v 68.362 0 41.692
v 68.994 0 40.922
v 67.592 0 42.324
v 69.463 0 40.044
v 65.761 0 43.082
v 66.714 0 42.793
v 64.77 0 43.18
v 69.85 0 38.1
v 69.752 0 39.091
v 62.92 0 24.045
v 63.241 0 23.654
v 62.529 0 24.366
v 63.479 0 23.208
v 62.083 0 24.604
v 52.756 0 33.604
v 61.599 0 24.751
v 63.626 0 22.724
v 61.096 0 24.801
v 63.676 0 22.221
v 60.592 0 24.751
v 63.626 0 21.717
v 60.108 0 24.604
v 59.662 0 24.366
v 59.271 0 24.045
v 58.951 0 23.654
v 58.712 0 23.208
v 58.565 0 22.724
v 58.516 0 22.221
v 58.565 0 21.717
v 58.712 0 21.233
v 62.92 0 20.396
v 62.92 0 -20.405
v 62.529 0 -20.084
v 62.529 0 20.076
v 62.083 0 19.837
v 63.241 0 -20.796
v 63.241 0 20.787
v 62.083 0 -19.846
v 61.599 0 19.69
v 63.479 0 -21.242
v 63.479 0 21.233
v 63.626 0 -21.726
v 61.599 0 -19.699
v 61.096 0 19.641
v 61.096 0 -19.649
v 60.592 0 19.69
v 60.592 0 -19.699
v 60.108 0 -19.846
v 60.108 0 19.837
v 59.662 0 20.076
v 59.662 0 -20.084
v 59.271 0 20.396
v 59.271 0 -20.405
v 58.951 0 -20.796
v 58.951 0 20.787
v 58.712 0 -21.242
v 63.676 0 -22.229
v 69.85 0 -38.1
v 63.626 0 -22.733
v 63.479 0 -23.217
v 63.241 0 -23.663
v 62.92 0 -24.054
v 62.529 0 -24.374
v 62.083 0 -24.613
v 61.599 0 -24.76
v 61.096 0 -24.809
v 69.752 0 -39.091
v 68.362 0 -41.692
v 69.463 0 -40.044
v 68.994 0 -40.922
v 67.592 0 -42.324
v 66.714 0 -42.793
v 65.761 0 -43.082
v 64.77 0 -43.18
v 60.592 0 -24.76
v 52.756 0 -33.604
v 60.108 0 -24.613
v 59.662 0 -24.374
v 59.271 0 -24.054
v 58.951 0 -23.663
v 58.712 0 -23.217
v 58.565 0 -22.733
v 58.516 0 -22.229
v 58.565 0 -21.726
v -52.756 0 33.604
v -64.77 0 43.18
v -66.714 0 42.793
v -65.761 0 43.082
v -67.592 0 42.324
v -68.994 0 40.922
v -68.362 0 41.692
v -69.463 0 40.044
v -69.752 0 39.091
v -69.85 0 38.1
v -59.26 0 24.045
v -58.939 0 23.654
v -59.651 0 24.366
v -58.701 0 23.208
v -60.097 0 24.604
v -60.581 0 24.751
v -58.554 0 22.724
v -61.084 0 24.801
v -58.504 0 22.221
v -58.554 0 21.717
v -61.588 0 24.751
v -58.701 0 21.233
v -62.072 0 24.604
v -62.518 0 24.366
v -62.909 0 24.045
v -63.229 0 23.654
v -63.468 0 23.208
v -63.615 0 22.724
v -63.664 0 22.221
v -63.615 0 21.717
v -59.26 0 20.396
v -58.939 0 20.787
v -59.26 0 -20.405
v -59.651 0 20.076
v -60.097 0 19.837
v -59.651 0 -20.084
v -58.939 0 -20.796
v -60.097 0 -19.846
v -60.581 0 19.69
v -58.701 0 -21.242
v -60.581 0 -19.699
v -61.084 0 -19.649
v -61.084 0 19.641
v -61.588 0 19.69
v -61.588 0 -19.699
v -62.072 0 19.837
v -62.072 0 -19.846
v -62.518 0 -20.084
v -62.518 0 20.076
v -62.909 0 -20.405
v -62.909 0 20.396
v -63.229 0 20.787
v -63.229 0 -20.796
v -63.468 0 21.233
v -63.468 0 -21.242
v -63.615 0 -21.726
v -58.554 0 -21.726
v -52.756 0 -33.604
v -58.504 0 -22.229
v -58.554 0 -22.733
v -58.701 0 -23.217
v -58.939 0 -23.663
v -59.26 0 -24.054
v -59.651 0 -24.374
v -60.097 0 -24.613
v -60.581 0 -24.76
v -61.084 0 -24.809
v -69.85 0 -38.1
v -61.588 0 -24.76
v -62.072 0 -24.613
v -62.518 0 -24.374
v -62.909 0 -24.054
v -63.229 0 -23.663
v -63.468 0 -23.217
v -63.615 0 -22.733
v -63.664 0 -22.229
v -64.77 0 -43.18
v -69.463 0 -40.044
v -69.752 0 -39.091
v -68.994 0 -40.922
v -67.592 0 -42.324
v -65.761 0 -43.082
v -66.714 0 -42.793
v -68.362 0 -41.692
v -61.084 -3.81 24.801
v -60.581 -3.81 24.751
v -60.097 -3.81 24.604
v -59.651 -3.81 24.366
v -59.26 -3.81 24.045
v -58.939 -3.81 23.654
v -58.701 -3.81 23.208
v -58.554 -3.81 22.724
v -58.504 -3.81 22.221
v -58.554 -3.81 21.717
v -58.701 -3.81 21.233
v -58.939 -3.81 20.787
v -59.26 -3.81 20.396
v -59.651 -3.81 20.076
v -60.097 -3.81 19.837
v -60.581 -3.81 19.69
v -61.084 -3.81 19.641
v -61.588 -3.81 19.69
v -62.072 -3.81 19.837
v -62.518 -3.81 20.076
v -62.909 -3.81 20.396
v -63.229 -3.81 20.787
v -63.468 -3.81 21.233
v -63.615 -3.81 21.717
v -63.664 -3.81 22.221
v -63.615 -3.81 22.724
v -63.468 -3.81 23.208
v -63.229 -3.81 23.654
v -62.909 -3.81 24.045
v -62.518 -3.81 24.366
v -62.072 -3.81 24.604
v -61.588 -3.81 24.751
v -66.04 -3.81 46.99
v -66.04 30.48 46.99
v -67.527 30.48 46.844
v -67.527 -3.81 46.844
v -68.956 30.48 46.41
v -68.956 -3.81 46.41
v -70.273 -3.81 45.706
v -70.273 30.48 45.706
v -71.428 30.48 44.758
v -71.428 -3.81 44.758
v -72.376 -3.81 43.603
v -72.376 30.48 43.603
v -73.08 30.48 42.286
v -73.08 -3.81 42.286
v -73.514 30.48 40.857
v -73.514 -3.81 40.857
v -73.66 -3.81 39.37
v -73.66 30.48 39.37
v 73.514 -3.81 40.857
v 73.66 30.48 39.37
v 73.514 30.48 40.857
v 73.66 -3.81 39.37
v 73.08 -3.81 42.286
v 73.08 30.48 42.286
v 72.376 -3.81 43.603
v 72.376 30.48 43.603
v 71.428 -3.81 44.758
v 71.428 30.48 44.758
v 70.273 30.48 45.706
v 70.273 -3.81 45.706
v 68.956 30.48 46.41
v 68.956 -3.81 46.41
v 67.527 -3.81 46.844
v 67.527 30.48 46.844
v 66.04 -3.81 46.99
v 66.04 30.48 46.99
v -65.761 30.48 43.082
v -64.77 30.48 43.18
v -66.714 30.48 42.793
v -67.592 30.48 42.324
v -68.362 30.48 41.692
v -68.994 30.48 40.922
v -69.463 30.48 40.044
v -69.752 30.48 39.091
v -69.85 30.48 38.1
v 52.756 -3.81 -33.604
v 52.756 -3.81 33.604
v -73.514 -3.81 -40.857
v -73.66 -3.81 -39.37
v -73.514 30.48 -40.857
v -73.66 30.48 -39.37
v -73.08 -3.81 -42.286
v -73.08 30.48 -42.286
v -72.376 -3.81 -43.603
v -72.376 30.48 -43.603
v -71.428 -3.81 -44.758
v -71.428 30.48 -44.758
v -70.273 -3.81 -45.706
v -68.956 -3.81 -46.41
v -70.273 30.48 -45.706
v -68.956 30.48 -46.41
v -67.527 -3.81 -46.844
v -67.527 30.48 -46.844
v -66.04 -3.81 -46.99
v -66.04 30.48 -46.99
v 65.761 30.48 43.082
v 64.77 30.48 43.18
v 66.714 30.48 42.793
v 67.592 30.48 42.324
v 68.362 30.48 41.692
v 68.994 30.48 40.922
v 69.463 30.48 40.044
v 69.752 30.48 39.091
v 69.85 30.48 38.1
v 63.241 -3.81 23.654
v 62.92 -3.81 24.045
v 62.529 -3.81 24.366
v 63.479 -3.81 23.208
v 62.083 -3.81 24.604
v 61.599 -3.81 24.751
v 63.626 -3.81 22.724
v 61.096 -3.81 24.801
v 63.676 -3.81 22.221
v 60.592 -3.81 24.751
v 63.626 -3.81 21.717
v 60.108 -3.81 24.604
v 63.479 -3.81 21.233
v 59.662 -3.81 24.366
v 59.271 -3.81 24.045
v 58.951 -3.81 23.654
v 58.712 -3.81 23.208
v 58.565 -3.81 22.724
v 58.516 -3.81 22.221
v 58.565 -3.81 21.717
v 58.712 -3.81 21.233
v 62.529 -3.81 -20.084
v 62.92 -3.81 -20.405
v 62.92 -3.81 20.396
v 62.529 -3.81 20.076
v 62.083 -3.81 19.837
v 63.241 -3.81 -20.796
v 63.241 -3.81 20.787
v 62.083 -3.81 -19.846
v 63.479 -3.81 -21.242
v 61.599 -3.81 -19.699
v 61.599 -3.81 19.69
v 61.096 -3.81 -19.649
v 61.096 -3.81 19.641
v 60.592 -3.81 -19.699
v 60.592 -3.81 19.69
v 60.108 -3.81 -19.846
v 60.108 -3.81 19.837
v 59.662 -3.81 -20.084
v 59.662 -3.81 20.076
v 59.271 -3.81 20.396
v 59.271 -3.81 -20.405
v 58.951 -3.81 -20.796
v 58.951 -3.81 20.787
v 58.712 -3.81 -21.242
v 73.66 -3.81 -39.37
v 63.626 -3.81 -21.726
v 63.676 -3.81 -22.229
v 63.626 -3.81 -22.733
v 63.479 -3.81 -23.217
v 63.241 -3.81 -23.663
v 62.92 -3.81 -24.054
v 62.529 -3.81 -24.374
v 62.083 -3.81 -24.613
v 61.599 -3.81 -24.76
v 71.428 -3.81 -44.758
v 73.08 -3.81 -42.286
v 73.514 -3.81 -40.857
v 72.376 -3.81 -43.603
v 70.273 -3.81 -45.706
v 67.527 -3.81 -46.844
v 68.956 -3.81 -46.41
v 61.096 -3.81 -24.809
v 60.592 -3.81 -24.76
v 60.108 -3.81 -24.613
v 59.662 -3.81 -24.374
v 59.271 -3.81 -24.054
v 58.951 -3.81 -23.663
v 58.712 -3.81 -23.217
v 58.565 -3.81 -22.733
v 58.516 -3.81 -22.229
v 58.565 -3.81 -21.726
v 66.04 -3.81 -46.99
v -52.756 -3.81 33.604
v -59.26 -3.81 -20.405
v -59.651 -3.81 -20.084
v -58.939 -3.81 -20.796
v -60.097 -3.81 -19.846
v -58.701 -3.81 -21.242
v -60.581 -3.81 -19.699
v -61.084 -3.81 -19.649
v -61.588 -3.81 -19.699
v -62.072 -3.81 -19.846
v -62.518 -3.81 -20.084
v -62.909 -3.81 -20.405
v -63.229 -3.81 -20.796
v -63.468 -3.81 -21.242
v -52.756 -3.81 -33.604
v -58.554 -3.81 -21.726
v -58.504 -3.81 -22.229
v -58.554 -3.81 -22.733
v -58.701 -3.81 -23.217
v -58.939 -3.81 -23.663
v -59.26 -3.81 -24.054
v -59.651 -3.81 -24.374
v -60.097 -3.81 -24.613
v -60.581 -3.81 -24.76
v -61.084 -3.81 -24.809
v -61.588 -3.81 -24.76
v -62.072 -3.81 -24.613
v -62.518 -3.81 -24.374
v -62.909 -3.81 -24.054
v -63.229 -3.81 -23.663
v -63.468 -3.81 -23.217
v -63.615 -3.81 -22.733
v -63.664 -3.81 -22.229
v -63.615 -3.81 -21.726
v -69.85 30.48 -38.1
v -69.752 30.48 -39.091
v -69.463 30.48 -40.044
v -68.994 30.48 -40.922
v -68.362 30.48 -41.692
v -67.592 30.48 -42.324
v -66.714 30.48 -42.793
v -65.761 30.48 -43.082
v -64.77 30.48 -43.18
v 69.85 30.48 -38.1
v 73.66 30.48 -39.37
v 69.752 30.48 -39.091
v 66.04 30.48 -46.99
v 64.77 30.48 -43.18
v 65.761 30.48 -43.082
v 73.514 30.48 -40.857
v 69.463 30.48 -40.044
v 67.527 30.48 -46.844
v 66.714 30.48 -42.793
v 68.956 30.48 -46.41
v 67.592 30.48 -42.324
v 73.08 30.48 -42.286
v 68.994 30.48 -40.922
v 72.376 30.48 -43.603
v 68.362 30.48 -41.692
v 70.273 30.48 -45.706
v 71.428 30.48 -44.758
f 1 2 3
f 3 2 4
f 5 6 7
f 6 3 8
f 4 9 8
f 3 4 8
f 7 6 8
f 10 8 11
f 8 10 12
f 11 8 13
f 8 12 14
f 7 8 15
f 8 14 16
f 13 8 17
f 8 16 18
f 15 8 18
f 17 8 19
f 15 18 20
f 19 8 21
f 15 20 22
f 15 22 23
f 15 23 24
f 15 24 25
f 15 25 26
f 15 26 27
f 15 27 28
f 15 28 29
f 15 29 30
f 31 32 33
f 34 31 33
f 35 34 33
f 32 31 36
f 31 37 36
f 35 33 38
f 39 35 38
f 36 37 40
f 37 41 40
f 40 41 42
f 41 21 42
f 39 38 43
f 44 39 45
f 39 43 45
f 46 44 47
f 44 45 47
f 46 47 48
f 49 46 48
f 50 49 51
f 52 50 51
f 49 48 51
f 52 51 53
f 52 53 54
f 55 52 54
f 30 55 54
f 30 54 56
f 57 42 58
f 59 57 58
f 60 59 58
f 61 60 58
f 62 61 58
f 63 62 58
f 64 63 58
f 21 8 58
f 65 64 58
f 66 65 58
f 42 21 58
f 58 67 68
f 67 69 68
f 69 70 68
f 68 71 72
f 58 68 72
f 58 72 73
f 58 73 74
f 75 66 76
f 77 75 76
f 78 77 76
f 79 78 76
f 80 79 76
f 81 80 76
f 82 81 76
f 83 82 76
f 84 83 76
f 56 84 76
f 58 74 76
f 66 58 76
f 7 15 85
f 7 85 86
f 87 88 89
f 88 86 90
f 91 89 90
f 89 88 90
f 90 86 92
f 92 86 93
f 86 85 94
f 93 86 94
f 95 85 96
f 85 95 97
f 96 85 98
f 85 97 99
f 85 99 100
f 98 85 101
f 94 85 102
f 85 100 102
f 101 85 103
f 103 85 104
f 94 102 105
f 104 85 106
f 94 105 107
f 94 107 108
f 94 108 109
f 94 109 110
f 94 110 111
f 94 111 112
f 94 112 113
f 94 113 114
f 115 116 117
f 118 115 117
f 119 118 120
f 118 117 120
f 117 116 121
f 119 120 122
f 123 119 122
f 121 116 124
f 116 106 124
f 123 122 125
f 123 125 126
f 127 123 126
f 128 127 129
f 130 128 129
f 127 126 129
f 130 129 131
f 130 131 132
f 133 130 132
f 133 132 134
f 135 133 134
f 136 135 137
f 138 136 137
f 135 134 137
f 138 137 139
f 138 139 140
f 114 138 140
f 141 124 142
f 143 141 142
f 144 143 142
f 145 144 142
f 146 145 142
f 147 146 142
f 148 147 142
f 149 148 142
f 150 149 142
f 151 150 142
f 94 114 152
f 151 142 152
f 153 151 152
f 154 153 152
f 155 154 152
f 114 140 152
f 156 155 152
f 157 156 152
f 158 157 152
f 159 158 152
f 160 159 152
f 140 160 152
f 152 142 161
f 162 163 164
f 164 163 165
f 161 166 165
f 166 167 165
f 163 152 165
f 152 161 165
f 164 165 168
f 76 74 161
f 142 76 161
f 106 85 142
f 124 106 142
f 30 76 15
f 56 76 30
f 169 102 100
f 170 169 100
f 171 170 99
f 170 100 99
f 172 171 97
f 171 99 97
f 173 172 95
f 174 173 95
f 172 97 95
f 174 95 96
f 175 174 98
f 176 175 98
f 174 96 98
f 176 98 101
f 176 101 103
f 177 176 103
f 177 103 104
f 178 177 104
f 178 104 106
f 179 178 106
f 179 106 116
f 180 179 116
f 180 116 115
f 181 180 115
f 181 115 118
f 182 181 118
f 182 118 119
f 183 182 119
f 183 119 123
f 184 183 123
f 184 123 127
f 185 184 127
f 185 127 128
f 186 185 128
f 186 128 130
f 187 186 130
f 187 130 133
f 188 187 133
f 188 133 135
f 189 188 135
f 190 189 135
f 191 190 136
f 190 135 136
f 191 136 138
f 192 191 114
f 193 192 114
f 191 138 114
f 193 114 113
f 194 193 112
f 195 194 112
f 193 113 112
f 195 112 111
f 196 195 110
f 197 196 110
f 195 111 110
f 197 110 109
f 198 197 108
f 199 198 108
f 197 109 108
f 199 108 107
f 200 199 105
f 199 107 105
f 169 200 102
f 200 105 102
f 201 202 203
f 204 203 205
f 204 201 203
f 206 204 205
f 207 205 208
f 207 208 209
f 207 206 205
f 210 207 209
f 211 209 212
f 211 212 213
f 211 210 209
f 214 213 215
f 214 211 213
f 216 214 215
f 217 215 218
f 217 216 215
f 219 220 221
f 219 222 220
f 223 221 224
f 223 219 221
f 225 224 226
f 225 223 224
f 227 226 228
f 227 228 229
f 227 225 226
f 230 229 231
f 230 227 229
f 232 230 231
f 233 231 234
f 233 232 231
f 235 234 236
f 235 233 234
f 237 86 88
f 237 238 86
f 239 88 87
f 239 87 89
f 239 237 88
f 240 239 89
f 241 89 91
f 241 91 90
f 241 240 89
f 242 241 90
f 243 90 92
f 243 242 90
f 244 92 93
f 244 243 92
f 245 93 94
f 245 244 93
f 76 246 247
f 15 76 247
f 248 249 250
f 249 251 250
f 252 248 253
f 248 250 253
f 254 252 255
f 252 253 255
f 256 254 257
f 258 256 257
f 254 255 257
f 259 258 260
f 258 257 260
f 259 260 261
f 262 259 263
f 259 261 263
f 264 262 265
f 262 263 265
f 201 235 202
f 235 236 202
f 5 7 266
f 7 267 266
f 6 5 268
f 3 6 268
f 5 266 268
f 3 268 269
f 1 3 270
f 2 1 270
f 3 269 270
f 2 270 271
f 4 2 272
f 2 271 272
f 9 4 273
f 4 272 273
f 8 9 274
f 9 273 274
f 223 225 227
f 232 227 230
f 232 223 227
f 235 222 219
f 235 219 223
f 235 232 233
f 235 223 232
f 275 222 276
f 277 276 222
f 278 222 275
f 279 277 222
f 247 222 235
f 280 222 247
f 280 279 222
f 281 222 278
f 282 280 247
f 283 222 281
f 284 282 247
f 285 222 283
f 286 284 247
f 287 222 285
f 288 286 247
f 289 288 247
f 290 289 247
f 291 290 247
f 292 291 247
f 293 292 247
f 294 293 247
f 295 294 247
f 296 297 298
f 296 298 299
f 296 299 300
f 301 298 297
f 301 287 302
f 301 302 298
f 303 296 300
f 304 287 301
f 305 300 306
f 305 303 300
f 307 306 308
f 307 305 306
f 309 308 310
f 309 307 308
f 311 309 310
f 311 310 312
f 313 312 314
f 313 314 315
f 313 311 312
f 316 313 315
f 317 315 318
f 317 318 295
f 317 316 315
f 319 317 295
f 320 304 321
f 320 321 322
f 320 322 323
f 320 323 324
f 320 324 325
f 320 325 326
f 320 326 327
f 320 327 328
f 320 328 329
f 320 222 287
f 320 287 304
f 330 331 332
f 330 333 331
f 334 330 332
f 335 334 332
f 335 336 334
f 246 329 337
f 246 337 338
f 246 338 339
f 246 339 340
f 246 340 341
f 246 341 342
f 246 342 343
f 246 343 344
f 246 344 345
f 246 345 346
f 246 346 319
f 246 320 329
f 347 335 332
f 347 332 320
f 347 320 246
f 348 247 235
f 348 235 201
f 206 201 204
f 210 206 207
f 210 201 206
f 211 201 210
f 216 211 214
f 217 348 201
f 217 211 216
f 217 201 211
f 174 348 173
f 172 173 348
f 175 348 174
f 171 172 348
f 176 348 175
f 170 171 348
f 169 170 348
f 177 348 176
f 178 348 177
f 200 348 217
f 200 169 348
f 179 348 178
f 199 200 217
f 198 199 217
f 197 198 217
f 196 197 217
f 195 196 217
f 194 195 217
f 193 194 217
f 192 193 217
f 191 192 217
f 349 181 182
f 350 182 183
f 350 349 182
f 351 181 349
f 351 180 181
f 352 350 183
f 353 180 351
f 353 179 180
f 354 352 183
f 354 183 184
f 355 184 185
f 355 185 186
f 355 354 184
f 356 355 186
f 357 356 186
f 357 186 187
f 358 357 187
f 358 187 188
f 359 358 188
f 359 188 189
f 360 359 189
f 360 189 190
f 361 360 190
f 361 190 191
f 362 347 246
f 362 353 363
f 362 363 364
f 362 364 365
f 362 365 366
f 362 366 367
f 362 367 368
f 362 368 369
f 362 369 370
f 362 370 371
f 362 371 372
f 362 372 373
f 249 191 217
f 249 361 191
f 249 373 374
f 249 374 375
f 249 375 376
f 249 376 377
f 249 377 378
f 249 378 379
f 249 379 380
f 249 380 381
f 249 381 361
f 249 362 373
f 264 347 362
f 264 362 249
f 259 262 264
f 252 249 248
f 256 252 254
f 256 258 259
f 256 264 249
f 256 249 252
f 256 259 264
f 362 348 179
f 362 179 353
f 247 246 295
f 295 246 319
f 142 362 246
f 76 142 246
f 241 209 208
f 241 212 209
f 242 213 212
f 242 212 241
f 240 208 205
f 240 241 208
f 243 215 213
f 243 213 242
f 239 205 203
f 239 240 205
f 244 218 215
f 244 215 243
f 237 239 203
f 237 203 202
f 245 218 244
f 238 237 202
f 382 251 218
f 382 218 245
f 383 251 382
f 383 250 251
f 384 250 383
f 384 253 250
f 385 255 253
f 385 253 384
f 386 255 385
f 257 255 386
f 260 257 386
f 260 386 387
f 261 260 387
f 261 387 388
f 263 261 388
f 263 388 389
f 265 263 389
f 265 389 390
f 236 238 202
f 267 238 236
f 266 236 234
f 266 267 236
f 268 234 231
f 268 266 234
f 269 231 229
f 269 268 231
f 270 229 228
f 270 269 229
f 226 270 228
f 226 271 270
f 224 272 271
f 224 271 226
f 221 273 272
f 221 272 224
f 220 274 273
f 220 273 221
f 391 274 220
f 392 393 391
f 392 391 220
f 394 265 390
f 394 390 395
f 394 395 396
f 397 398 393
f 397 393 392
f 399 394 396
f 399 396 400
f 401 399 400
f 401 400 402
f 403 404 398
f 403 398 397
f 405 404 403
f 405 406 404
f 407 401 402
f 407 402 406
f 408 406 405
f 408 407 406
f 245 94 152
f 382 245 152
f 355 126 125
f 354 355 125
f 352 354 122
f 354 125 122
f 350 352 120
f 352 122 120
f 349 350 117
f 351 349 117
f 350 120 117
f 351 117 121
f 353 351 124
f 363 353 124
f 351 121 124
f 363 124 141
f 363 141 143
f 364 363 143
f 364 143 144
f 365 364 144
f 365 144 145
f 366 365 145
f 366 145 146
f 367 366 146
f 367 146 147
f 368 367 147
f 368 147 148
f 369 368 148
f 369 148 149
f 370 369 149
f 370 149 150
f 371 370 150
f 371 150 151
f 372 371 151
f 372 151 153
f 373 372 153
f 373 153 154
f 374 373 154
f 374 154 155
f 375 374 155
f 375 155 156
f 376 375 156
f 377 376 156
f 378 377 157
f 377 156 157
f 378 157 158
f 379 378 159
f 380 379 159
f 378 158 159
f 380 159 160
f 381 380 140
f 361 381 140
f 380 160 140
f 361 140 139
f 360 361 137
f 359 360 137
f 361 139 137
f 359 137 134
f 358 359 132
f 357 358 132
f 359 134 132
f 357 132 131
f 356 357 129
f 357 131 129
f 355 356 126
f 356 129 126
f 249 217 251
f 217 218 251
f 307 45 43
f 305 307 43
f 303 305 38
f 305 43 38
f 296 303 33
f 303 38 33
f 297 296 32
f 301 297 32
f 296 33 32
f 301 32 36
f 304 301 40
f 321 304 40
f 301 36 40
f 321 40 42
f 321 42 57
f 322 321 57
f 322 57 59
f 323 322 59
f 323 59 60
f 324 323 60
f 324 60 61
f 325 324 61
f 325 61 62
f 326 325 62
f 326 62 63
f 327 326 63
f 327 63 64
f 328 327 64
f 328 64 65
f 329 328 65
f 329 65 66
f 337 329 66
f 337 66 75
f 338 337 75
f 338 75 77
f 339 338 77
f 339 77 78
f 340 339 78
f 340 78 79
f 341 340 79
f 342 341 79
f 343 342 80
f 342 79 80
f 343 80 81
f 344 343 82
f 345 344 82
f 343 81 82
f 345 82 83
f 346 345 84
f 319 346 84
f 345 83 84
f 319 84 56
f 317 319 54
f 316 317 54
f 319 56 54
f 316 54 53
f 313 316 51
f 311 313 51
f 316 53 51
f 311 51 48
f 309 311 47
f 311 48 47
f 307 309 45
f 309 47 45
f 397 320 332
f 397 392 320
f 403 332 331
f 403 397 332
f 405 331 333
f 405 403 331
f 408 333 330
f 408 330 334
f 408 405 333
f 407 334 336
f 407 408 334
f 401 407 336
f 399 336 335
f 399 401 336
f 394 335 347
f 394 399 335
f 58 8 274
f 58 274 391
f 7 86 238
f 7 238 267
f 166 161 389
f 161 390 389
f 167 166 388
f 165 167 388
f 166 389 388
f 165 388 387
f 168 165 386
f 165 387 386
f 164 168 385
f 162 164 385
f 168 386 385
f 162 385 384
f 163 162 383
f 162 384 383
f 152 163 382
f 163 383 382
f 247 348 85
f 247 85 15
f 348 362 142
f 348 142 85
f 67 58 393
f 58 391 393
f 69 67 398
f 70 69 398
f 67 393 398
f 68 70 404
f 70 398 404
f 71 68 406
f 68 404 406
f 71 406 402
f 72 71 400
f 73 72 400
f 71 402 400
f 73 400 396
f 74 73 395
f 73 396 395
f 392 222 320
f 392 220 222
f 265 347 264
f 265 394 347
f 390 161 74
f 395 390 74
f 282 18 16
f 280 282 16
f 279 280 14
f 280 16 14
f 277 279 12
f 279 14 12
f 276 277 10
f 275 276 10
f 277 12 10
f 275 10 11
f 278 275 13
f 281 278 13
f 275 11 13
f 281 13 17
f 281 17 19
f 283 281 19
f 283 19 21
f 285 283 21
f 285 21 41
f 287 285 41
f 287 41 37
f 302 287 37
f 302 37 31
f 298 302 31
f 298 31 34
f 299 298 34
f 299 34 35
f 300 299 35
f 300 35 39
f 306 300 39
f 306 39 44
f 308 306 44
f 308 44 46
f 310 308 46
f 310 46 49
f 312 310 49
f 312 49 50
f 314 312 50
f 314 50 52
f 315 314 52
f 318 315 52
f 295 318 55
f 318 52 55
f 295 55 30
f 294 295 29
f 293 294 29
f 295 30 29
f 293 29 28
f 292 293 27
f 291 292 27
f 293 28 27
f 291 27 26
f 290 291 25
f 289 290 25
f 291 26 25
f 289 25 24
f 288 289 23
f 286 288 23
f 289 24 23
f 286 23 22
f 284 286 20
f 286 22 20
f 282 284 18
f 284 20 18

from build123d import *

# Parameters (mm, degrees)
SKETCH1_W           = 147.32
SKETCH1_H           = 93.98
SKETCH1_W_2         = 139.7
SKETCH1_H_2         = 86.36
BOSS_EXTRUDE1_DEPTH = 30.48
SKETCH2_W           = 147.32
SKETCH2_H           = 93.98
BOSS_EXTRUDE2_DEPTH = 3.81
FILLET1_R           = 7.62
FILLET2_R           = 5.08
CUT_EXTRUDE2_REACH  = 95.86
SKETCH4_W           = 105.5116
SKETCH4_H           = 67.2084
CUT_EXTRUDE3_REACH  = 94.536
SKETCH5_R           = 2.58


with BuildPart() as part:
    # Sketch1 → Boss-Extrude1 (new body)
    with BuildSketch(Plane(origin=(0, 0, 0), x_dir=(1, 0, 0), z_dir=(0, 1, 0))):
        Rectangle(SKETCH1_W, SKETCH1_H)
        Rectangle(SKETCH1_W_2, SKETCH1_H_2, mode=Mode.SUBTRACT)
    extrude(amount=BOSS_EXTRUDE1_DEPTH)

    # Sketch2 → Boss-Extrude2 (add)
    with BuildSketch(Plane(origin=(0, 0, 0), x_dir=(-1, 0, 0), z_dir=(0, -1, 0))):
        Rectangle(SKETCH2_W, SKETCH2_H)
    extrude(amount=BOSS_EXTRUDE2_DEPTH)

    # Fillet1
    fillet1_edges = [part.edges().sort_by_distance(p)[0] for p in [
        (-73.66, 13.335, -46.99),
        (73.66, 13.335, -46.99),
        (73.66, 13.335, 46.99),
        (-73.66, 13.335, 46.99),
    ]]
    fillet(fillet1_edges, radius=FILLET1_R)

    # Fillet2
    fillet2_edges = [part.edges().sort_by_distance(p)[0] for p in [
        (-69.85, 15.24, -43.18),
        (-69.85, 15.24, 43.18),
        (69.85, 15.24, 43.18),
        (69.85, 15.24, -43.18),
    ]]
    fillet(fillet2_edges, radius=FILLET2_R)

    # Sketch4 → Cut-Extrude2 (cut, up to next)
    with BuildSketch(Plane.XZ.offset(3.81), mode=Mode.PRIVATE) as cut_extrude2_sk1:
        Rectangle(SKETCH4_W, SKETCH4_H)
    cut_extrude2_tool1 = extrude(cut_extrude2_sk1.sketch, amount=-CUT_EXTRUDE2_REACH, mode=Mode.PRIVATE) & part.part
    add(cut_extrude2_tool1.solids().sort_by_distance((0, -3.81, 0))[0], mode=Mode.SUBTRACT)

    # Sketch5 → Cut-Extrude3 (cut, up to next)
    with BuildSketch(Plane(origin=(0, 0, 0), x_dir=(1, 0, 0), z_dir=(0, 1, 0)), mode=Mode.PRIVATE) as cut_extrude3_sk1:
        with Locations(Location((-61.0842, -22.2208, 0), (0, 0, 270))):
            Circle(SKETCH5_R)
    cut_extrude3_tool1 = extrude(cut_extrude3_sk1.sketch, amount=-CUT_EXTRUDE3_REACH, mode=Mode.PRIVATE) & part.part
    # Sketch5 → Cut-Extrude3 (cut, up to next)
    with BuildSketch(Plane(origin=(0, 0, 0), x_dir=(1, 0, 0), z_dir=(0, 1, 0)), mode=Mode.PRIVATE) as cut_extrude3_sk2:
        with Locations(Location((61.0958, -22.2208, 0), (0, 0, 270))):
            Circle(SKETCH5_R)
    cut_extrude3_tool2 = extrude(cut_extrude3_sk2.sketch, amount=-CUT_EXTRUDE3_REACH, mode=Mode.PRIVATE) & part.part
    # Sketch5 → Cut-Extrude3 (cut, up to next)
    with BuildSketch(Plane(origin=(0, 0, 0), x_dir=(1, 0, 0), z_dir=(0, 1, 0)), mode=Mode.PRIVATE) as cut_extrude3_sk3:
        with Locations(Location((61.0958, 22.2292, 0), (0, 0, 270))):
            Circle(SKETCH5_R)
    cut_extrude3_tool3 = extrude(cut_extrude3_sk3.sketch, amount=-CUT_EXTRUDE3_REACH, mode=Mode.PRIVATE) & part.part
    # Sketch5 → Cut-Extrude3 (cut, up to next)
    with BuildSketch(Plane(origin=(0, 0, 0), x_dir=(1, 0, 0), z_dir=(0, 1, 0)), mode=Mode.PRIVATE) as cut_extrude3_sk4:
        with Locations(Location((-61.0842, 22.2292, 0), (0, 0, 270))):
            Circle(SKETCH5_R)
    cut_extrude3_tool4 = extrude(cut_extrude3_sk4.sketch, amount=-CUT_EXTRUDE3_REACH, mode=Mode.PRIVATE) & part.part
    add(cut_extrude3_tool1.solids().sort_by_distance((-61.0842, 0, 22.2208))[0], mode=Mode.SUBTRACT)
    add(cut_extrude3_tool2.solids().sort_by_distance((61.0958, 0, 22.2208))[0], mode=Mode.SUBTRACT)
    add(cut_extrude3_tool3.solids().sort_by_distance((61.0958, 0, -22.2292))[0], mode=Mode.SUBTRACT)
    add(cut_extrude3_tool4.solids().sort_by_distance((-61.0842, 0, -22.2292))[0], mode=Mode.SUBTRACT)


solid = part.part
